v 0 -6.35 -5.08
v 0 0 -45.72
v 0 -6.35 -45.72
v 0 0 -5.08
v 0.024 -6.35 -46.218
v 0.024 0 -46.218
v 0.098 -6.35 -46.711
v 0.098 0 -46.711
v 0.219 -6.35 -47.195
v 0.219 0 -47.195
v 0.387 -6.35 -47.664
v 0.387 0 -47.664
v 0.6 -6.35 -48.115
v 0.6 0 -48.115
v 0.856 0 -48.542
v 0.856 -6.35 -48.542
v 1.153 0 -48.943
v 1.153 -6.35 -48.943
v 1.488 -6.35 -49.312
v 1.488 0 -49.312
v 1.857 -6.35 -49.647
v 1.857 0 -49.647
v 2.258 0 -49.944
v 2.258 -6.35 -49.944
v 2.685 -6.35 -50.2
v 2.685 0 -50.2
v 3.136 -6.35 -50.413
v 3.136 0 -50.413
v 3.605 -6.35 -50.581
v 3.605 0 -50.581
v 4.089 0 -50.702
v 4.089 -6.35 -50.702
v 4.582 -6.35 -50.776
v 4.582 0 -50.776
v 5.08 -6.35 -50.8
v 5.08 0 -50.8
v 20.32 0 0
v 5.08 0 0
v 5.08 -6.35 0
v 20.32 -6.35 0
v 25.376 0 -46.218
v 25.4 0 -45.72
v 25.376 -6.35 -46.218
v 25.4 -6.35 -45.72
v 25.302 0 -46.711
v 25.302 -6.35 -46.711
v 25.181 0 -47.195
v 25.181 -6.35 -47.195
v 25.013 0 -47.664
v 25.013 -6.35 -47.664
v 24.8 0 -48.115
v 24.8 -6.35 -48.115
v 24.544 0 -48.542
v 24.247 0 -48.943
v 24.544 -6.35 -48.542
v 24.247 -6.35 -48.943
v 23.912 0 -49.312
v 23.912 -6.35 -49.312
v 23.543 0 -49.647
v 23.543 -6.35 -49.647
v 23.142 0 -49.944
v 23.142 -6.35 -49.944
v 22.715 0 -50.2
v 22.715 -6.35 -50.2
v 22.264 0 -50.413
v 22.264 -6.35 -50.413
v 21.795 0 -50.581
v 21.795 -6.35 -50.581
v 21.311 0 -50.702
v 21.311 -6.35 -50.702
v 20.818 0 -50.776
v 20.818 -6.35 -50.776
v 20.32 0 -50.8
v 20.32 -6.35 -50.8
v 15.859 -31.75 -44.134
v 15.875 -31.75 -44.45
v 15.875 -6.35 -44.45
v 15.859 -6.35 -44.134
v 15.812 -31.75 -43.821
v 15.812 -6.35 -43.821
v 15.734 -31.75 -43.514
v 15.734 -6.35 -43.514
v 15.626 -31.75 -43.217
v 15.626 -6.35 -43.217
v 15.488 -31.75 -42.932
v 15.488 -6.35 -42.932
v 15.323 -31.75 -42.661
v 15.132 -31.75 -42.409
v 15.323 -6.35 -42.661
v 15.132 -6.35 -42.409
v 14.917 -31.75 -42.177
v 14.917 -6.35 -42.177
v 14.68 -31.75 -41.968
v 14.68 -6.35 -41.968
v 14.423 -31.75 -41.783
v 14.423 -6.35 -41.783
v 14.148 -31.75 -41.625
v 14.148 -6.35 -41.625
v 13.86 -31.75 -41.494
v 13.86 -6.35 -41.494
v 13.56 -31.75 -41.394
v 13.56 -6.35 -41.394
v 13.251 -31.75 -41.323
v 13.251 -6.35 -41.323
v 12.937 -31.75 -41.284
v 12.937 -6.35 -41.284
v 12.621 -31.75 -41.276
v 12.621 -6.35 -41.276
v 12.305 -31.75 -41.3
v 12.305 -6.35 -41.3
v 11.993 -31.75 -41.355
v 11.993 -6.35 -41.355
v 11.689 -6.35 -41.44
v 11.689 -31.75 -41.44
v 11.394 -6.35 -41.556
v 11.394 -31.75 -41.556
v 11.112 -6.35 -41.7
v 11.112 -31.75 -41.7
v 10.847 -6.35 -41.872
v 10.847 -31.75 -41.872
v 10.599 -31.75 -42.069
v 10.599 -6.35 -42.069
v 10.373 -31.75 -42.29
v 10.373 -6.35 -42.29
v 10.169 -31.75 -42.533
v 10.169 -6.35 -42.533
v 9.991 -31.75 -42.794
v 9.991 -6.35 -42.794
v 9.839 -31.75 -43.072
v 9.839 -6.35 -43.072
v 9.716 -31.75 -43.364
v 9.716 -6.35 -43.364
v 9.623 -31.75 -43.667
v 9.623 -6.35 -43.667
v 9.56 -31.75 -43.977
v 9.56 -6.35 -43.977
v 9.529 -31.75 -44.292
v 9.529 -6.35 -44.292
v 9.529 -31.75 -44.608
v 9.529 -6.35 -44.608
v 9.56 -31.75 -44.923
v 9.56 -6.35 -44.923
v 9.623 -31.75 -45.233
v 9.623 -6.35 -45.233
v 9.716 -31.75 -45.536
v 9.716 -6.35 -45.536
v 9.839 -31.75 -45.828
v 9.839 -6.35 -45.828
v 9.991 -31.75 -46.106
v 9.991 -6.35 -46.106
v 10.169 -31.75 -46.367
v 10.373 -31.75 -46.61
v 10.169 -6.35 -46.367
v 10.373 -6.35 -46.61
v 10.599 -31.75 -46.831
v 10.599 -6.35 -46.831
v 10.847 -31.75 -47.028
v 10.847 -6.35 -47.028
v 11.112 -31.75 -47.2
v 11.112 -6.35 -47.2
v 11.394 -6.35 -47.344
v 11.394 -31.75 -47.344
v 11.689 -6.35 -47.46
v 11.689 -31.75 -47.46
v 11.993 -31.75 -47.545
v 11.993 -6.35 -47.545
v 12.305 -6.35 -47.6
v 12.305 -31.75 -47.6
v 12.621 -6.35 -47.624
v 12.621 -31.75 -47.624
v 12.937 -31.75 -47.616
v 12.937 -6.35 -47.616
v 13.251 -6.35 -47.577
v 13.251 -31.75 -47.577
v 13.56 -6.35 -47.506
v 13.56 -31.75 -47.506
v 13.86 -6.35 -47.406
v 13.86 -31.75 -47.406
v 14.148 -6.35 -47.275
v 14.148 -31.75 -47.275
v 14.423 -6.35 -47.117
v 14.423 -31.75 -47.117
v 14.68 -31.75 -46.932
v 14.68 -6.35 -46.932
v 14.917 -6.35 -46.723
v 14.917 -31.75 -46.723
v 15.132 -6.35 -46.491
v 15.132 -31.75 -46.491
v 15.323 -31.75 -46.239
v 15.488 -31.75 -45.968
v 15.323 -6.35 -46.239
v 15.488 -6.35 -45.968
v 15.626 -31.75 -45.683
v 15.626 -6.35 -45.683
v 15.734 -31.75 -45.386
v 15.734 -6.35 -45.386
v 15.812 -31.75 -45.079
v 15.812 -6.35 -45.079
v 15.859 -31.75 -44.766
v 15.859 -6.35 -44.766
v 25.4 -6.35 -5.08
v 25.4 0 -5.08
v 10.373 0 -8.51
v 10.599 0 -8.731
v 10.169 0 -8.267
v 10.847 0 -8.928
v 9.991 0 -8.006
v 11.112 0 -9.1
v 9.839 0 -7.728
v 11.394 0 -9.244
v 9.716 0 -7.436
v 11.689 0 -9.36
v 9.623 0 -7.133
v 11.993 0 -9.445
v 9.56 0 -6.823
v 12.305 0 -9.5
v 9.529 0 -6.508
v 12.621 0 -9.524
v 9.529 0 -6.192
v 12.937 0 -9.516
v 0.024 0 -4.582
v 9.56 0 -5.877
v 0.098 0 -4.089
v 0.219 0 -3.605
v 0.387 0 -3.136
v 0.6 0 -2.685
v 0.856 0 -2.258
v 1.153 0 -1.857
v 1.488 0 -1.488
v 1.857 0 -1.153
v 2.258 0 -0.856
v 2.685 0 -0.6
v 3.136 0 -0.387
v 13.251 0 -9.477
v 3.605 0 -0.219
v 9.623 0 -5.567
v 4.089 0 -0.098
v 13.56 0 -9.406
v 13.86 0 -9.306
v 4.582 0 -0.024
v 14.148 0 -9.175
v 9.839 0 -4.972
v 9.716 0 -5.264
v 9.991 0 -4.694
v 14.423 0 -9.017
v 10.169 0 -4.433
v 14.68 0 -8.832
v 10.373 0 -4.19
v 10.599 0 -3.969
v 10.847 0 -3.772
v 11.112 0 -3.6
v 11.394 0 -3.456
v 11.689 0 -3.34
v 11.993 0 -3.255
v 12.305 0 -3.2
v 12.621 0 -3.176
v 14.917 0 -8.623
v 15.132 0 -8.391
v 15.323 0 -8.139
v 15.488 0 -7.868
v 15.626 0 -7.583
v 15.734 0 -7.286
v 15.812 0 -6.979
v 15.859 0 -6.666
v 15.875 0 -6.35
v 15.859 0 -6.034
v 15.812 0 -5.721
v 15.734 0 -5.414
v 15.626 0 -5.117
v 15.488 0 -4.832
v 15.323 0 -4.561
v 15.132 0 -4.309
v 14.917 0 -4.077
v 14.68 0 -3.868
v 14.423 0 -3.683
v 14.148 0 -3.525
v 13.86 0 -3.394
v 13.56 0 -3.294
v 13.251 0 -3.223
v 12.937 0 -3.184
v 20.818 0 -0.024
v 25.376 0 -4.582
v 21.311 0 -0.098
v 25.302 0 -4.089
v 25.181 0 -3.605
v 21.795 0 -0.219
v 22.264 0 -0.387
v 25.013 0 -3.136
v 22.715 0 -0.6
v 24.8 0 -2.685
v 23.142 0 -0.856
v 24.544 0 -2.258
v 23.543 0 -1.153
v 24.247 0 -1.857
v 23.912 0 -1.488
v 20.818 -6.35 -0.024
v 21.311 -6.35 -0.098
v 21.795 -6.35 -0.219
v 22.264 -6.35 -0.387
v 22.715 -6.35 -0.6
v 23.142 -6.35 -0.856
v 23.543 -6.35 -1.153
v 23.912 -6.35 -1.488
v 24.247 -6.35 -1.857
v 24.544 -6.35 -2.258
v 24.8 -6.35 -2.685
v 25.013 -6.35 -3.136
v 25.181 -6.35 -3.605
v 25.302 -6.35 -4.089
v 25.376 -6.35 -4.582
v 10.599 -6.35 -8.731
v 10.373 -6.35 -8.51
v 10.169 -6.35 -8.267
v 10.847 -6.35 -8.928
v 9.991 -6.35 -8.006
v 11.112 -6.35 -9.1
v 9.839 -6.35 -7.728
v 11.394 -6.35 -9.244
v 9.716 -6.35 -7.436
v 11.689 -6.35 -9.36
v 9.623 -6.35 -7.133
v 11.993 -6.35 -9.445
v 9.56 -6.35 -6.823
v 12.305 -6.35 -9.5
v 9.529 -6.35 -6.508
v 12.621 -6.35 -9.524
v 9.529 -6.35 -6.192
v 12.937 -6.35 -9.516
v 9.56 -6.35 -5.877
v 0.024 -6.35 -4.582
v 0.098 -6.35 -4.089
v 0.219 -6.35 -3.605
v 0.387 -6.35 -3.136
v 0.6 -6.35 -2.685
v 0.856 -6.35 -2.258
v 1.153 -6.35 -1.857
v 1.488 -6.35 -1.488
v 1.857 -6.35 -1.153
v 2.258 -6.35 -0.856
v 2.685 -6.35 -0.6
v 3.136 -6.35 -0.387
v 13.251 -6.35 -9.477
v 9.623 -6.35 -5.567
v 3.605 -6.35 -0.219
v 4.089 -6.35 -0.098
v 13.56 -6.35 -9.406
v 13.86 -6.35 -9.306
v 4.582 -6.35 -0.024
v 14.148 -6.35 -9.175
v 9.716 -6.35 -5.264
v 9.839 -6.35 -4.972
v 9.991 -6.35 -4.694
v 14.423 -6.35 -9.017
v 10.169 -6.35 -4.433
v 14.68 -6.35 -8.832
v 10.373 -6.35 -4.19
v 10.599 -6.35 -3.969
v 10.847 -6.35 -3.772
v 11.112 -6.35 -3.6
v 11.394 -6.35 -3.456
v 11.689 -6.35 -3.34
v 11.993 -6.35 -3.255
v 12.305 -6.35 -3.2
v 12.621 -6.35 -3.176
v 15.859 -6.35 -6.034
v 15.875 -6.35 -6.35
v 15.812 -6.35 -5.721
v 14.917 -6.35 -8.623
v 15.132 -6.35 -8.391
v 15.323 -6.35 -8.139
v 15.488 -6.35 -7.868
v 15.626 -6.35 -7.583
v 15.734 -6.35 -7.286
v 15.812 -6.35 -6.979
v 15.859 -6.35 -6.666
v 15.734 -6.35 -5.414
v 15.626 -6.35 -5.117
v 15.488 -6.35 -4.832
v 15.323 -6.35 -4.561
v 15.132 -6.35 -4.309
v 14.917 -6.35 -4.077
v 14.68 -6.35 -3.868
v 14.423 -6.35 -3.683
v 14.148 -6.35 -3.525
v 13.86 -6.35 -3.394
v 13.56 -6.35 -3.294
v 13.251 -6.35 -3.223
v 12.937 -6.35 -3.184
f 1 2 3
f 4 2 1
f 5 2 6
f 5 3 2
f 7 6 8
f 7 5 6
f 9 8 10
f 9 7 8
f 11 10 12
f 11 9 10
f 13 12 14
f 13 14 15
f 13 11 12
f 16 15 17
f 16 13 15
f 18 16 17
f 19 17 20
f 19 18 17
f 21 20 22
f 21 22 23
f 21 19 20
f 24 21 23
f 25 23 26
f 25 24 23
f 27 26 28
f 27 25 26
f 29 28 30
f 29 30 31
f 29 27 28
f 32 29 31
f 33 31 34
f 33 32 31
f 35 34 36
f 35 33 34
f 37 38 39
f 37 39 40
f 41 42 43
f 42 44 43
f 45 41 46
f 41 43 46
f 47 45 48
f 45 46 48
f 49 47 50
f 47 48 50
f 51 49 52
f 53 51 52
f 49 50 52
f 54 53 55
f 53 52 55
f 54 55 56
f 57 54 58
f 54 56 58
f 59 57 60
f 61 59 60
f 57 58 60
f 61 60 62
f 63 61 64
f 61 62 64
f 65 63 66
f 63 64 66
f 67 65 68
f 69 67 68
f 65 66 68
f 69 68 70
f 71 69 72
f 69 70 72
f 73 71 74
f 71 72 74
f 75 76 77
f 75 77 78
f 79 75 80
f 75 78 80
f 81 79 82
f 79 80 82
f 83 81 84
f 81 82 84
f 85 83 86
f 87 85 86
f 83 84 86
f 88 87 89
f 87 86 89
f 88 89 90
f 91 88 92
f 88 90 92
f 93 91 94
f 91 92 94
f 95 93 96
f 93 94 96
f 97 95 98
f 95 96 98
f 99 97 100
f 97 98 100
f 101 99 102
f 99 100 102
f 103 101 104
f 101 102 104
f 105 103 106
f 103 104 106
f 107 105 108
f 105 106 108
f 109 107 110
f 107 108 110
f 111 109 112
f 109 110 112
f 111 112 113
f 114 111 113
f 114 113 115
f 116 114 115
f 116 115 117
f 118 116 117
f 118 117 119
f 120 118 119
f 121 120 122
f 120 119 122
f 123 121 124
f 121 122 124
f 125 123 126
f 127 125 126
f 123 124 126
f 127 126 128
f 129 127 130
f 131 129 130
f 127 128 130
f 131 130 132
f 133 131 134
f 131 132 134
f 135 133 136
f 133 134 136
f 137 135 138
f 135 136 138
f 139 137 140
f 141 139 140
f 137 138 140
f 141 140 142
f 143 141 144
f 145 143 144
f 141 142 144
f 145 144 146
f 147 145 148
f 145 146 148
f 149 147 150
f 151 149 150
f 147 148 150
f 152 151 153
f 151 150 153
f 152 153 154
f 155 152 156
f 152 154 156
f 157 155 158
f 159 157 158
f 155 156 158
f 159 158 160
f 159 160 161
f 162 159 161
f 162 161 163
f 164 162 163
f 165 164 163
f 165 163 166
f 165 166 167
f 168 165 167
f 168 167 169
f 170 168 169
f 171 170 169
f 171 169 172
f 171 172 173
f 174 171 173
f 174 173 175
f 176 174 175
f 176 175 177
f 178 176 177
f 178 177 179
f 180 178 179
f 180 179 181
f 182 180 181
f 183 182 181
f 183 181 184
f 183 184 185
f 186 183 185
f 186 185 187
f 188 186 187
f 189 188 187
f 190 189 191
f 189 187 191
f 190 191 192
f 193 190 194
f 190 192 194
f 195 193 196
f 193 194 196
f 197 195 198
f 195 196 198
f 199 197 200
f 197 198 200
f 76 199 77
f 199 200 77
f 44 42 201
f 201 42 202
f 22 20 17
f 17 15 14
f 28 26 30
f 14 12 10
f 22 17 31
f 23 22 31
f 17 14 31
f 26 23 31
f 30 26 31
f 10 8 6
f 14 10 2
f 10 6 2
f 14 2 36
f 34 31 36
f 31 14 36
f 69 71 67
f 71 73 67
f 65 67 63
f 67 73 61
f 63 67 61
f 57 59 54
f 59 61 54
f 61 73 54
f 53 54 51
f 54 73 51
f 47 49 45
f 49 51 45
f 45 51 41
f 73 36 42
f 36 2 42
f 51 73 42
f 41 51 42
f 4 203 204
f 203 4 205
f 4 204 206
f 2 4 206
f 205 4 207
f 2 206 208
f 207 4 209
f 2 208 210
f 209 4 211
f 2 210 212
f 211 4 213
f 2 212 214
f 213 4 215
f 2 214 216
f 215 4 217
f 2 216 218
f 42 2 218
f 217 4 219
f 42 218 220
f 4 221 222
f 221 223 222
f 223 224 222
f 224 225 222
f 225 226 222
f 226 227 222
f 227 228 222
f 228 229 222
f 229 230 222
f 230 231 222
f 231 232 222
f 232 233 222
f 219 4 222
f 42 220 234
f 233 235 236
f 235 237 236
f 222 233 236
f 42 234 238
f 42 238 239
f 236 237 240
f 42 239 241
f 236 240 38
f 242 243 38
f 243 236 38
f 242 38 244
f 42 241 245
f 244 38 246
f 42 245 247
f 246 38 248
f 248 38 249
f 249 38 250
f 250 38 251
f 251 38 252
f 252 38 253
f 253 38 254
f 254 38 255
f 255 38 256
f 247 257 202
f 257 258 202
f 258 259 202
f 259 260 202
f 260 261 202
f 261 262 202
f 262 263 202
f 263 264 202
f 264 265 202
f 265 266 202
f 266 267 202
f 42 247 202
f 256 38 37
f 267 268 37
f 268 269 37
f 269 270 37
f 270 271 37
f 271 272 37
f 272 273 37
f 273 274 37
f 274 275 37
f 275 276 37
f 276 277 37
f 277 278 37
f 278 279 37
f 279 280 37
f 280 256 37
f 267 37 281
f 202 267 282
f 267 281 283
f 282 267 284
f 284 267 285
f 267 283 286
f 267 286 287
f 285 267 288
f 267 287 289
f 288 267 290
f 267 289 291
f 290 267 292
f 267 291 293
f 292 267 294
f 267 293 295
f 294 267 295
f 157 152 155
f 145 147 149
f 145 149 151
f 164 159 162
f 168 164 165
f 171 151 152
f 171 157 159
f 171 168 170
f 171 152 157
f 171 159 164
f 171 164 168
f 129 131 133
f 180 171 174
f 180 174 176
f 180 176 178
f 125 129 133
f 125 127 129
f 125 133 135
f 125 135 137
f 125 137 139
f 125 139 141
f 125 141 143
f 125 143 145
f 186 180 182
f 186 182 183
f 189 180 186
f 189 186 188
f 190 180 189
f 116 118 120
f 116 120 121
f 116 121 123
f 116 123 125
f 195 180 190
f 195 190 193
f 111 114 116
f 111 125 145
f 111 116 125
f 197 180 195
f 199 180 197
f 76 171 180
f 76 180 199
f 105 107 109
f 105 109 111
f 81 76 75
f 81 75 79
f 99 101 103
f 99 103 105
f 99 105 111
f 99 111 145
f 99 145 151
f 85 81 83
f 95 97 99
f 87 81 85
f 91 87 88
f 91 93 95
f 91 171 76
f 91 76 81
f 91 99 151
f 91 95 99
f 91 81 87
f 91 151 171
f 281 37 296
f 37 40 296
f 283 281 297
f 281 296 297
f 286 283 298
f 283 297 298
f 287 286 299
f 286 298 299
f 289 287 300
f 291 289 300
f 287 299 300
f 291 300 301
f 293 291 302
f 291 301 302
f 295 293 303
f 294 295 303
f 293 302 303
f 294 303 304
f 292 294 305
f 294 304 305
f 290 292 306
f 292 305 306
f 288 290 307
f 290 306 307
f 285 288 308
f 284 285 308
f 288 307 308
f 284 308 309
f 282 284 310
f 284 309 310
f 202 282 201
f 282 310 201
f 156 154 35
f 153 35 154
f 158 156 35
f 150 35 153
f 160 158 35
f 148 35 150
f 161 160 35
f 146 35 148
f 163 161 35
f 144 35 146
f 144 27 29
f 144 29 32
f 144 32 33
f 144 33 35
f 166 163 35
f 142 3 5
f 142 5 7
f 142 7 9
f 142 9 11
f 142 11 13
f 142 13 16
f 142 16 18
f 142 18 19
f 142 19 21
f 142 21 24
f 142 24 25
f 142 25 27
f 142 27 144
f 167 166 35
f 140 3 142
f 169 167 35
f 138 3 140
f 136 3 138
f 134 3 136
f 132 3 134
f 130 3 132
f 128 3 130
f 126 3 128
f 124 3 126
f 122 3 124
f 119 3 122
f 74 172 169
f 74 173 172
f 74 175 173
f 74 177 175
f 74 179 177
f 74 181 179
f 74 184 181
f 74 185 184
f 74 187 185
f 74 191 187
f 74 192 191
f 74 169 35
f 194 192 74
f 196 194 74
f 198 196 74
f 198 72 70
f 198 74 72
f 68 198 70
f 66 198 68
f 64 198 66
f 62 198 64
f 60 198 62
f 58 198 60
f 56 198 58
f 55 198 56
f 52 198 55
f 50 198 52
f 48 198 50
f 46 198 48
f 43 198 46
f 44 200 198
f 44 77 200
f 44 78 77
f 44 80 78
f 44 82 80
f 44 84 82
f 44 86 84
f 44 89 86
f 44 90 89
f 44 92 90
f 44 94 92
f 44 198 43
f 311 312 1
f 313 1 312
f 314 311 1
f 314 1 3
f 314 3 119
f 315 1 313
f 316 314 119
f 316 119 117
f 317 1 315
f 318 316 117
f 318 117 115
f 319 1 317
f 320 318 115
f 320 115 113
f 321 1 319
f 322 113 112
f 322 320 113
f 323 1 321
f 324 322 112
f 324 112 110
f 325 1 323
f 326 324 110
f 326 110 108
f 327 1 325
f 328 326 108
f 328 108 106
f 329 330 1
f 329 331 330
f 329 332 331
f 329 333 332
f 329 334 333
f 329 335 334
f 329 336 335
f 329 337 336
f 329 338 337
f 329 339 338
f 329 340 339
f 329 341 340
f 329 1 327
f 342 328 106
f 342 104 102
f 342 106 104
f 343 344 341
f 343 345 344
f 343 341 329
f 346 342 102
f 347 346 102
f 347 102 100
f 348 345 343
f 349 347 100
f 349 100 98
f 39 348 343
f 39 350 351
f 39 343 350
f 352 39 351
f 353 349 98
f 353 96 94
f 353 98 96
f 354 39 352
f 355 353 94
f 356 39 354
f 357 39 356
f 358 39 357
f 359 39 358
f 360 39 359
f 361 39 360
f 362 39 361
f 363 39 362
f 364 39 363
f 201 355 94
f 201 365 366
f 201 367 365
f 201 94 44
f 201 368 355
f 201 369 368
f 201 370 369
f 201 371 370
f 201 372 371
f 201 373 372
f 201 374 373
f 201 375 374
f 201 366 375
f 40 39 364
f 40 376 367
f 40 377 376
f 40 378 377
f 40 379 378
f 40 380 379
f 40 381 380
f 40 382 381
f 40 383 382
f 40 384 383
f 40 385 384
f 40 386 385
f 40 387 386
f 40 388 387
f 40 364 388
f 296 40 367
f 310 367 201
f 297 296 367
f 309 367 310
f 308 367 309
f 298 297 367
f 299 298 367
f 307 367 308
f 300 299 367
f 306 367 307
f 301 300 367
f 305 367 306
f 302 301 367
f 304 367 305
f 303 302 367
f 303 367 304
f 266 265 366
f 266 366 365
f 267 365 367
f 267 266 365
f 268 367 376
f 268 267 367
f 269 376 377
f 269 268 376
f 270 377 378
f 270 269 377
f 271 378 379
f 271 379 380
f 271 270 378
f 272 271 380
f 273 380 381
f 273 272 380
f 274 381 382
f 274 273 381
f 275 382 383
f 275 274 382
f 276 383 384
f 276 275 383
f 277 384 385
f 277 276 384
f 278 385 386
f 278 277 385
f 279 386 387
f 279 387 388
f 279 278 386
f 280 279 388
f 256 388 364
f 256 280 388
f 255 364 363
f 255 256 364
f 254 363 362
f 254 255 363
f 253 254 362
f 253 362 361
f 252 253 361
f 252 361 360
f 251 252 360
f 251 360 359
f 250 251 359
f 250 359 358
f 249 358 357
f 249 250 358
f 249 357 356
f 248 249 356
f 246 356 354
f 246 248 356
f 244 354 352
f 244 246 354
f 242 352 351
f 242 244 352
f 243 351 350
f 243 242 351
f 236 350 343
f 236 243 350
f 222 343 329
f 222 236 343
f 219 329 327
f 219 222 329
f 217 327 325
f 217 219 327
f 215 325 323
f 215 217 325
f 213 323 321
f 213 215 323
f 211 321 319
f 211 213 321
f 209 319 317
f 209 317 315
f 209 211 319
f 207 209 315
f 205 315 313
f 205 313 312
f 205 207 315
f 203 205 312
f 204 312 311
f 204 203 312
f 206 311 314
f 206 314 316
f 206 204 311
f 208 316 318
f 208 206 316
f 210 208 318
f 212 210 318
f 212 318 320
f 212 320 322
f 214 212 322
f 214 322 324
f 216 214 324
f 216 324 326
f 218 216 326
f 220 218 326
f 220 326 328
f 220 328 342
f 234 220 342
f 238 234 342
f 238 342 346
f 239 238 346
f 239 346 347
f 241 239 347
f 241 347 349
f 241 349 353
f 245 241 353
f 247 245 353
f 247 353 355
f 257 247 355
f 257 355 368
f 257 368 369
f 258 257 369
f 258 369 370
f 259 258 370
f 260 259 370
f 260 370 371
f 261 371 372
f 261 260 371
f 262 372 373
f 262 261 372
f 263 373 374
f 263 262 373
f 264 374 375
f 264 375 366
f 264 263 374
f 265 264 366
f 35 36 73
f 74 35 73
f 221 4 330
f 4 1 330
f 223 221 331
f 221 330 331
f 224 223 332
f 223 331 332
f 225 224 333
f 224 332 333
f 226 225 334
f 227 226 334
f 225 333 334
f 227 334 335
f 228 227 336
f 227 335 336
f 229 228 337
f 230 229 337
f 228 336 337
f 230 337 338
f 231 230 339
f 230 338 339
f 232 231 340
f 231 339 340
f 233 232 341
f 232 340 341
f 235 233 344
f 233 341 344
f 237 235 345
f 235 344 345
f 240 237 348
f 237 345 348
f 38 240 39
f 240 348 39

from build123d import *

# Parameters (mm, degrees)
F0_W     = 25.4
F0_H     = 50.8
F0_R     = 3.175
F1_DEPTH = 6.35
F2_R     = 5.08
F3_R     = 5.08
F4_R     = 5.08
F5_R     = 3.175
F6_DEPTH = 25.4


with BuildPart() as f1:
    # F0 (on Front) → F1 (new body)
    with BuildSketch(Plane.XZ):
        with Locations((12.7, -25.4)):
            Rectangle(F0_W, F0_H)
        with Locations((12.7, -6.35)):
            Circle(F0_R, mode=Mode.SUBTRACT)
    extrude(amount=F1_DEPTH)

    # F2
    f2_edges = [f1.edges().sort_by_distance(p)[0] for p in [
        (0, -3.175, 0),
    ]]
    fillet(f2_edges, radius=F2_R)

    # F3
    f3_edges = [f1.edges().sort_by_distance(p)[0] for p in [
        (25.4, -3.175, 0),
    ]]
    fillet(f3_edges, radius=F3_R)

    # F4
    f4_edges = [f1.edges().sort_by_distance(p)[0] for p in [
        (25.4, -3.175, -50.8),
        (0, -3.175, -50.8),
    ]]
    fillet(f4_edges, radius=F4_R)

    # F5 (on face) → F6 (join)
    with BuildSketch(Plane.XZ.offset(6.35)):
        with Locations((12.7, -44.45)):
            Circle(F5_R)
    extrude(amount=F6_DEPTH)


solid = f1.part
